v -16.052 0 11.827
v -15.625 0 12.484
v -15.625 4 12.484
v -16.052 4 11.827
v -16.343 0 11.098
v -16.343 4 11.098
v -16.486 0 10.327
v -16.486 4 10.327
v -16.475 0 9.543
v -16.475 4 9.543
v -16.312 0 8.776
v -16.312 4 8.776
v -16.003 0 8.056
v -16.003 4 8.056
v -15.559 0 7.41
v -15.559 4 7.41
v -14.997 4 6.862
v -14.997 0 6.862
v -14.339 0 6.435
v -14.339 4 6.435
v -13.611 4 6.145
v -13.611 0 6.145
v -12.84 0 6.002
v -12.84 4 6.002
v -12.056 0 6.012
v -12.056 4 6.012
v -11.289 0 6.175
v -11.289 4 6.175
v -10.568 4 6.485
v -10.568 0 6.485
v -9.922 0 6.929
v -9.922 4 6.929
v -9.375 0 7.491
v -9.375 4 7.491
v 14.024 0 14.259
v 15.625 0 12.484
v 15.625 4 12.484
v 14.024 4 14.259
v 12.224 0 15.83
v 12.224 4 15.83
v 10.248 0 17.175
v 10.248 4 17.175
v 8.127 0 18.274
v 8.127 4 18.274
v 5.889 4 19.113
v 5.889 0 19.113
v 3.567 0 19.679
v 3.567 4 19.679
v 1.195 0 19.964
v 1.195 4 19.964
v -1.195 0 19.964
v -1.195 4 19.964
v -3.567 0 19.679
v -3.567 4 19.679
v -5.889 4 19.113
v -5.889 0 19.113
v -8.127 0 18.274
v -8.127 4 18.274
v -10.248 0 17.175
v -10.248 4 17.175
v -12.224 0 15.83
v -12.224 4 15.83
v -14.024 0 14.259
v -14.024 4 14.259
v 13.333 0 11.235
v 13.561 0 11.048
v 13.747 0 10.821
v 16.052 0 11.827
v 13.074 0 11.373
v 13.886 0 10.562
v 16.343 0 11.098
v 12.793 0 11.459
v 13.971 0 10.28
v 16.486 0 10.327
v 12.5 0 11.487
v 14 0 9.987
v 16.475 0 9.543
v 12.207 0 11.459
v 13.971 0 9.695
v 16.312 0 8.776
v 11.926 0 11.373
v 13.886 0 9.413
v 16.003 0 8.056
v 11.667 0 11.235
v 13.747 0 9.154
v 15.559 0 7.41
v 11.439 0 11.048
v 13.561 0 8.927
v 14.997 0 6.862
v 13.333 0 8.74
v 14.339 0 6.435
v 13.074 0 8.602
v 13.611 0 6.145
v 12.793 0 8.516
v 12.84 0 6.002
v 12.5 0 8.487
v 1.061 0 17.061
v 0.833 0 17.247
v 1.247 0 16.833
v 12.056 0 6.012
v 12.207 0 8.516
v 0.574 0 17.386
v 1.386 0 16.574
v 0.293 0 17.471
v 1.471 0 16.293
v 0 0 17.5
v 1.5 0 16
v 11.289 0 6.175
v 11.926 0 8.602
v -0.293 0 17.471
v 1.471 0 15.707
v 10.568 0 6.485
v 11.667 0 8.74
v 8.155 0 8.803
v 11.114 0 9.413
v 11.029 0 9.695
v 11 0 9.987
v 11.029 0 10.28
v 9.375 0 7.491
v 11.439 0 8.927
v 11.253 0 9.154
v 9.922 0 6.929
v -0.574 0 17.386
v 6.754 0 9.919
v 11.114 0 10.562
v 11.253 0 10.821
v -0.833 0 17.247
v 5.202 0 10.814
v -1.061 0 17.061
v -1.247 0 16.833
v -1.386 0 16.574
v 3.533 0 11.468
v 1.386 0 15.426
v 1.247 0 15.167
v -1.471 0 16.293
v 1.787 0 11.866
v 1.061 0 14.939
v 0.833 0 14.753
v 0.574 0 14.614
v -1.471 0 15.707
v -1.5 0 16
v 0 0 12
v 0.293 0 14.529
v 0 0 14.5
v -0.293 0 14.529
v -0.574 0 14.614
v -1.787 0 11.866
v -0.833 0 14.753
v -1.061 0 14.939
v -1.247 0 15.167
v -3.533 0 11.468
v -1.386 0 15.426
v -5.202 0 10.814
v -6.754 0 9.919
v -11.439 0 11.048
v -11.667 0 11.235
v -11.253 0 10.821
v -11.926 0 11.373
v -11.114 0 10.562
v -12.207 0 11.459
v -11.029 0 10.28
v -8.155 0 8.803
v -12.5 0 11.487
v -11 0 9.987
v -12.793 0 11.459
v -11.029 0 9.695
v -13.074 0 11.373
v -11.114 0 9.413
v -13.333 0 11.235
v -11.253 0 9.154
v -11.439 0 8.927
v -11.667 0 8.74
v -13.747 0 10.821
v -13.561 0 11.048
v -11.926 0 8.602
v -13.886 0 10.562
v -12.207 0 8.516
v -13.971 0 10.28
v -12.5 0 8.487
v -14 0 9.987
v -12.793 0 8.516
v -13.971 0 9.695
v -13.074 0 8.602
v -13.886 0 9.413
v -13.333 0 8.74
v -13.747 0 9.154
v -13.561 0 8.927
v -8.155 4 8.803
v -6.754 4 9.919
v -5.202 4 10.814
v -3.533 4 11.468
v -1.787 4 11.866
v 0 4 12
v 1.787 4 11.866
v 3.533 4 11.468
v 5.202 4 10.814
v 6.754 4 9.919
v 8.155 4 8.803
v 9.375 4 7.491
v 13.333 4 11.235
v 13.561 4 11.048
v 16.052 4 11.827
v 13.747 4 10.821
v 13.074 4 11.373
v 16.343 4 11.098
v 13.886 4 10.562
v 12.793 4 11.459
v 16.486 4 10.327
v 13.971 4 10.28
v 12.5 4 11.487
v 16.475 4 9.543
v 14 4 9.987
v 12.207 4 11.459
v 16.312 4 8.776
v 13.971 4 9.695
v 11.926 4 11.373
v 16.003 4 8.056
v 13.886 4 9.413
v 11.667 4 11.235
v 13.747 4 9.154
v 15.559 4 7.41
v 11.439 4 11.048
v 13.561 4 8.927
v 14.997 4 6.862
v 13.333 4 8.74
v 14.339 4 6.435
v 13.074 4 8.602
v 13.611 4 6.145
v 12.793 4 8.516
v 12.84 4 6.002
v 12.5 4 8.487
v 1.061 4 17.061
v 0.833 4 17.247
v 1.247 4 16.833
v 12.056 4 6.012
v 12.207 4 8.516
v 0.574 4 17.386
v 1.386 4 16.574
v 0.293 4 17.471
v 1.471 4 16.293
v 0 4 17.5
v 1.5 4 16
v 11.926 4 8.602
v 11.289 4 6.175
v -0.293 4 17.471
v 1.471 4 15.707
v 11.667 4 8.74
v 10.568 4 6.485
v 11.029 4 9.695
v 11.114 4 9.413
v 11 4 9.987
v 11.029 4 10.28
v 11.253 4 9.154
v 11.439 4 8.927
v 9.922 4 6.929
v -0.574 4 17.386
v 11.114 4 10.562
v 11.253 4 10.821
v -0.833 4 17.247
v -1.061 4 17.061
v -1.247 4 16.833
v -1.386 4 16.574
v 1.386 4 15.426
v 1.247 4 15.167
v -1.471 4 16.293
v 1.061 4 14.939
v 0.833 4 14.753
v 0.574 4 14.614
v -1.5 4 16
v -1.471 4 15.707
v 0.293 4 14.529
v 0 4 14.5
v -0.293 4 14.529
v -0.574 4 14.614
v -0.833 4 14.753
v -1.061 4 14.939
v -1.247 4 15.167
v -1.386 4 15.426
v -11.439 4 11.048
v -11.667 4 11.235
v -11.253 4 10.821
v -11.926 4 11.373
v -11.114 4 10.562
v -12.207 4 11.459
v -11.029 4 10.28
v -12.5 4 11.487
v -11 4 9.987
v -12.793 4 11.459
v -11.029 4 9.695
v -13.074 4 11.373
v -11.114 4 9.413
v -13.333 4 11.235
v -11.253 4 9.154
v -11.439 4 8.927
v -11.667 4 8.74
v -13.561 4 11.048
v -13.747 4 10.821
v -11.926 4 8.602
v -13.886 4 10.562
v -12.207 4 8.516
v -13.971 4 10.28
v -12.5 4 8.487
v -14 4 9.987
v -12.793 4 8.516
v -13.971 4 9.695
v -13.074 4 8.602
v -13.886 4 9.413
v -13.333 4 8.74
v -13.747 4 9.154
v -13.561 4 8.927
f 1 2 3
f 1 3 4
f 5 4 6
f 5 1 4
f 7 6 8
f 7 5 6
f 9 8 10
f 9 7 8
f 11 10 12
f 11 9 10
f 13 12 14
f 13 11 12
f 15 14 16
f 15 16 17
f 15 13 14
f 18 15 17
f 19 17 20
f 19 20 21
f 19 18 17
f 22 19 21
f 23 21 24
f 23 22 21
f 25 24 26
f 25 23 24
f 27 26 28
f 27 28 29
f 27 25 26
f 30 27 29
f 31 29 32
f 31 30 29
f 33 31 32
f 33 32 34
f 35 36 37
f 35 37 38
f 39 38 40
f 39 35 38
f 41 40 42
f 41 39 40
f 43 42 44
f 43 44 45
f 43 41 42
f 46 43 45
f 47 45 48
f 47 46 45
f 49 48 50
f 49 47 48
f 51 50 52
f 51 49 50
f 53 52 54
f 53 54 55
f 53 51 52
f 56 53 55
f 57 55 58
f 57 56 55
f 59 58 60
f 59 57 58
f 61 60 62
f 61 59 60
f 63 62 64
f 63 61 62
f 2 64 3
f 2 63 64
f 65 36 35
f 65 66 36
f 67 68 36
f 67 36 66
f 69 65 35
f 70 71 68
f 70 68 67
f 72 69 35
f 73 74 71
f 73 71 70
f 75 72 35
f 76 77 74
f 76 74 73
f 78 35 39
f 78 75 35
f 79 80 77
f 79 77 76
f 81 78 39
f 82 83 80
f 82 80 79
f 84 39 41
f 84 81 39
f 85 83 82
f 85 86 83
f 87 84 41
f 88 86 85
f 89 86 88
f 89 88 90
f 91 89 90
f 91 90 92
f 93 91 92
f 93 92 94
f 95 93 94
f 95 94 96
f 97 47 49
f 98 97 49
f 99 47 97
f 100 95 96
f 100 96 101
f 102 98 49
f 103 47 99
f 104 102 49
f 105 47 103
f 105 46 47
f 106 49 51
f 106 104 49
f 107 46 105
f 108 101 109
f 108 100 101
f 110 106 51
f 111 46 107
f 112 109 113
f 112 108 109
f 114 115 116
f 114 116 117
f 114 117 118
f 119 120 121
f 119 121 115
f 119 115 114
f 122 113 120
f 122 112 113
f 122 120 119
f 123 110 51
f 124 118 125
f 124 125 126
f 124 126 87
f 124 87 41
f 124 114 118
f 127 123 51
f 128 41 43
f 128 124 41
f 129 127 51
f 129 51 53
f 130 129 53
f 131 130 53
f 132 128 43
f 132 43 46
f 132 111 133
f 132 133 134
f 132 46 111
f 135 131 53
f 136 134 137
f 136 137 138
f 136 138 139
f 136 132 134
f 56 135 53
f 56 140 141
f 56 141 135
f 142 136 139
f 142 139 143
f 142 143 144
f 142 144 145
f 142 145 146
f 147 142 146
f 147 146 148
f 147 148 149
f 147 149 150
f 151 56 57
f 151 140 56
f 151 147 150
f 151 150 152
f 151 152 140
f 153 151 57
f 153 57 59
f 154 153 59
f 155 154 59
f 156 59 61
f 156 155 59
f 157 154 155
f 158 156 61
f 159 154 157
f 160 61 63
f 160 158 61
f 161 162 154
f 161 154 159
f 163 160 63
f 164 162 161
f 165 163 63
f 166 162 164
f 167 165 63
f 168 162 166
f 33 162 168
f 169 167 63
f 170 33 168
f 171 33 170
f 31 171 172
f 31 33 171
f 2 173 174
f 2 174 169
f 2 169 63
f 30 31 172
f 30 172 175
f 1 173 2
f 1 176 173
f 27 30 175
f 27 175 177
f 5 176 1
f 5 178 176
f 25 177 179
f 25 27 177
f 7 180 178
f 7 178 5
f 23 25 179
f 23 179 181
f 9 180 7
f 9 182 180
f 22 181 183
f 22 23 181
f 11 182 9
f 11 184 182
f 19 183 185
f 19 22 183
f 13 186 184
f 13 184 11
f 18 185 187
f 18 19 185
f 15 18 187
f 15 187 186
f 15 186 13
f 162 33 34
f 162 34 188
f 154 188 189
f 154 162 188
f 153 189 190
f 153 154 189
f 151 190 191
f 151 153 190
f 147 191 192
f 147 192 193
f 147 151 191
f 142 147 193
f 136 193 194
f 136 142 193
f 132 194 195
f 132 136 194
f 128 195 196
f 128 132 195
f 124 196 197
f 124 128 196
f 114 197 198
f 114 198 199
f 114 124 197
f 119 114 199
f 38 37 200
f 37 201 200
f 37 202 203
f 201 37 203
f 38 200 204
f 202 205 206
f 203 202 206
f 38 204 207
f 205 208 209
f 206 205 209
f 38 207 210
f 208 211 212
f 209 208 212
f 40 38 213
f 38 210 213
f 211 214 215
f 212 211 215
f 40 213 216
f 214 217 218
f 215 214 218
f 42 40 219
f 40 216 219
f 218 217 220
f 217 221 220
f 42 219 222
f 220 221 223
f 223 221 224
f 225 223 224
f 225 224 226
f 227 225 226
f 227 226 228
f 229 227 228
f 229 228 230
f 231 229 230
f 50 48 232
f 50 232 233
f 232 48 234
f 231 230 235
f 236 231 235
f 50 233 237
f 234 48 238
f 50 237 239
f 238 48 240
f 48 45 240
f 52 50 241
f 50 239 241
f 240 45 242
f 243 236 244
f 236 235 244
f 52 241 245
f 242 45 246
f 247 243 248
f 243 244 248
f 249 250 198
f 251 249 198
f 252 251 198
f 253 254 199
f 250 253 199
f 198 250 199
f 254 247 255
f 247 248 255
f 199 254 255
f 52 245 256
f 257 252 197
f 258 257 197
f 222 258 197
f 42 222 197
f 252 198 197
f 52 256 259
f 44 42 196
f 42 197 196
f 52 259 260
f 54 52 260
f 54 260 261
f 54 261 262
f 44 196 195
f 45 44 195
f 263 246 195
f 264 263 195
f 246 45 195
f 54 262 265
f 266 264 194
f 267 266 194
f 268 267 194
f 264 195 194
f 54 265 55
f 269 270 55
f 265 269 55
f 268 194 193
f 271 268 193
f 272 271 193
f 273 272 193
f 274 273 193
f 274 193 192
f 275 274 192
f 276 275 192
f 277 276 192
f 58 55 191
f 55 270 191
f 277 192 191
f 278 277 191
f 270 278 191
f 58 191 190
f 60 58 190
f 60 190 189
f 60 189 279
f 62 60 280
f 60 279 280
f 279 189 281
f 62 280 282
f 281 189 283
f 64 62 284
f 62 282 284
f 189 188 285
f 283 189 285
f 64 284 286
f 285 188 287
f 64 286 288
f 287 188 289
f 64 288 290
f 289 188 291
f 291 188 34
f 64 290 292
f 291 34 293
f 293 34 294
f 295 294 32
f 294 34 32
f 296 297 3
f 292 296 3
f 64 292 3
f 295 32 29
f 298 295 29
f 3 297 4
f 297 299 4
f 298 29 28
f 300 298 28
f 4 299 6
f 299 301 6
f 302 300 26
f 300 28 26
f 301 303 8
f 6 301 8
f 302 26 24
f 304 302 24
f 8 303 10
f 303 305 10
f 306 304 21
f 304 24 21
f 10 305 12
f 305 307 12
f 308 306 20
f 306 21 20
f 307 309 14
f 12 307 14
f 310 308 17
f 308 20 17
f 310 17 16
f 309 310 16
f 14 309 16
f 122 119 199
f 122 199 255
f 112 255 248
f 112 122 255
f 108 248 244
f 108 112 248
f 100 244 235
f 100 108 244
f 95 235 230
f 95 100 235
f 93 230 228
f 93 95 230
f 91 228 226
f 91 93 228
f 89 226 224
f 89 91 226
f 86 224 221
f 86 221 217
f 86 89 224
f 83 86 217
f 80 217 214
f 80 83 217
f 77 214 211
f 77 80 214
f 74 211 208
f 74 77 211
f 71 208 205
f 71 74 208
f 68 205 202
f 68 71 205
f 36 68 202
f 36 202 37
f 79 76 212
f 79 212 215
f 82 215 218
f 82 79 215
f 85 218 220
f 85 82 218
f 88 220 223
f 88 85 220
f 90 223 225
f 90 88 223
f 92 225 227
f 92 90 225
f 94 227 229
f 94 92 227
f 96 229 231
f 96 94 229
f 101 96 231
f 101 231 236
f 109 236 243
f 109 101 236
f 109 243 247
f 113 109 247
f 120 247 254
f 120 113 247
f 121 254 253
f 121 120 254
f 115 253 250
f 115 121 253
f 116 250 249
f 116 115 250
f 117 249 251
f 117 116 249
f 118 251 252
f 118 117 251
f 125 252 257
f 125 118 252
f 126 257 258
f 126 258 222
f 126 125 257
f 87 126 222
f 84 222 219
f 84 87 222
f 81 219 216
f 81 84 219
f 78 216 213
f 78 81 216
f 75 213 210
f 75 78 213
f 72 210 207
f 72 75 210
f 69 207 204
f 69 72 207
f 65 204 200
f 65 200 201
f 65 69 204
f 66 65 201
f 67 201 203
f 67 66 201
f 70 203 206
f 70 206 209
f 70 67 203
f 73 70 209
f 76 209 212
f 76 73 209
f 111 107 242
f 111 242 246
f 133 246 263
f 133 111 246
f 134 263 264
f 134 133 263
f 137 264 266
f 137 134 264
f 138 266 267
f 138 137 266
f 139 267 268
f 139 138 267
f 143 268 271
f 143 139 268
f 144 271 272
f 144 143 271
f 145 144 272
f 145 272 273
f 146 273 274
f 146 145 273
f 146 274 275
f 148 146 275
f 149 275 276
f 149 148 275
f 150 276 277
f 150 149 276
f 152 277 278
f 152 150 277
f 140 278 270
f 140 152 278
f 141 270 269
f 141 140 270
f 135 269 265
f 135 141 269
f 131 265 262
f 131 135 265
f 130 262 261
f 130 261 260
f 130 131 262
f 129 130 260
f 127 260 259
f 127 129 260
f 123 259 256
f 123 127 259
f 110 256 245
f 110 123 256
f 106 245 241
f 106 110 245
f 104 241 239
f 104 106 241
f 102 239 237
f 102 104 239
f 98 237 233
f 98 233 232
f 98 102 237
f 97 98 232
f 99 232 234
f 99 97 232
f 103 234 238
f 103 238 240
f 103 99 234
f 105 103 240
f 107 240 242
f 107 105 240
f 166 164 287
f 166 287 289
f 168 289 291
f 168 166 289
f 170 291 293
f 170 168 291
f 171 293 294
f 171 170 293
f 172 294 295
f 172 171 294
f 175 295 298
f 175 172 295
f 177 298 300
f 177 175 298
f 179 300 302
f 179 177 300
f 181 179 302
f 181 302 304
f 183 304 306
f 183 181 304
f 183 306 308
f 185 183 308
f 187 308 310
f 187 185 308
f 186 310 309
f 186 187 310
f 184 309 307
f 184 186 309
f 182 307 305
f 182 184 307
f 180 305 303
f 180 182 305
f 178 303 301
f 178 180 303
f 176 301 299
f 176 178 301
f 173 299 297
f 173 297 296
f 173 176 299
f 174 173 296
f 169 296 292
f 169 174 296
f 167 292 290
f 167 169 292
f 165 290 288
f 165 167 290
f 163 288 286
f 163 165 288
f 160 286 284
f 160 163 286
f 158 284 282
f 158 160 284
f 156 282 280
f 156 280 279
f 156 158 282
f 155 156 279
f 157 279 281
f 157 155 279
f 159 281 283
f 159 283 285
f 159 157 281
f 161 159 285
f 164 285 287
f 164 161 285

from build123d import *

# Parameters (mm, degrees)
SKETCH1_R           = 1.5
BOSS_EXTRUDE1_DEPTH = 4


with BuildPart() as part:
    # Sketch1 → Boss-Extrude1 (new body)
    with BuildSketch(Plane(origin=(0, 0, 0), x_dir=(1, 0, 0), z_dir=(0, 1, 0))):
        with BuildLine():
            ThreePointArc((-9.375, -7.490619133), (0, -12), (9.375, -7.490619133))
            ThreePointArc((9.375, -7.490619133), (14.996873044, -6.862492178), (15.625, -12.484365222))
            ThreePointArc((15.625, -12.484365222), (0, -20), (-15.625, -12.484365222))
            ThreePointArc((-15.625, -12.484365222), (-14.996873044, -6.862492178), (-9.375, -7.490619133))
        make_face()
        with Locations((-12.5, -9.987492178)):
            Circle(SKETCH1_R, mode=Mode.SUBTRACT)
        with Locations((12.5, -9.987492178)):
            Circle(SKETCH1_R, mode=Mode.SUBTRACT)
        with Locations((0, -16)):
            Circle(SKETCH1_R, mode=Mode.SUBTRACT)
    extrude(amount=BOSS_EXTRUDE1_DEPTH)


solid = part.part
